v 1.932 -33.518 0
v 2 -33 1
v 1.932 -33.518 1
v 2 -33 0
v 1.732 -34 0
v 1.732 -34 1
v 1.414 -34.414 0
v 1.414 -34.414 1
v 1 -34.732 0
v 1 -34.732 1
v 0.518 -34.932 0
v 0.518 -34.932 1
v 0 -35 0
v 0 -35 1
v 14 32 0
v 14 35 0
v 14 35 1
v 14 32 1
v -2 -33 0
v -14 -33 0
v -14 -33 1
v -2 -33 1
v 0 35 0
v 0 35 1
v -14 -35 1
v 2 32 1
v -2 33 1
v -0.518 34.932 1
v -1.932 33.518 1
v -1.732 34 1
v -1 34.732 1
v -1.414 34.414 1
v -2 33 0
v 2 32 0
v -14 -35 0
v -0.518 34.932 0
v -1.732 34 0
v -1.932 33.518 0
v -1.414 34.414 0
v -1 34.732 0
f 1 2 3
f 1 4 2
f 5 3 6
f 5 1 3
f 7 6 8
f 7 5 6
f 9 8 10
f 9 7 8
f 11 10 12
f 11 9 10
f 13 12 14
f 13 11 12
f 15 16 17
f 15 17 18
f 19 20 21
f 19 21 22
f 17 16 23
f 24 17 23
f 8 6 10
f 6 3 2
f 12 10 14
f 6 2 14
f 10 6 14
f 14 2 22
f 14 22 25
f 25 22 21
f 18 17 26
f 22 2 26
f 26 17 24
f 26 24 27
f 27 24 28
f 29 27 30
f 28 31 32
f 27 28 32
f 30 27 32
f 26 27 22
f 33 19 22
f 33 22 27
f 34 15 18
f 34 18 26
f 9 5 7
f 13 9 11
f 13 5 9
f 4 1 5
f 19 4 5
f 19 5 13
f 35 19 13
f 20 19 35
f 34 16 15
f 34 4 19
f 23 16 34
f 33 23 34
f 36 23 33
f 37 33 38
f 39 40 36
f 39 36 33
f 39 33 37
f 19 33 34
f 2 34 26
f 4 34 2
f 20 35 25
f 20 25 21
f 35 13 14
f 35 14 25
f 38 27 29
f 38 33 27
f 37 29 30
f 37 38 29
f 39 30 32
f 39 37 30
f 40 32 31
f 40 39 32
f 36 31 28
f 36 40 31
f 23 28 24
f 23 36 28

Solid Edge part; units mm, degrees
sketch "Sketch1" plane through (0, 0, 0) normal (0, 0, 1) x (1, 0, 0)
  line L0 (14, 35) -> (14, 32)
  line L1 (14, 32) -> (2, 32)
  line L2 (2, 32) -> (2, -33)
  arc A0 (2, -33) -> (0, -35) centre (0, -33) cw
  line L3 (0, -35) -> (-14, -35)
  line L4 (-14, -35) -> (-14, -33)
  line L5 (-14, -33) -> (-2, -33)
  line L6 (-2, -33) -> (-2, 33)
  arc A1 (-2, 33) -> (0, 35) centre (0, 33) cw
  line L7 (14, 35) -> (0, 35)
  dimension "D1" = 3
  dimension "D2" = 12
  dimension "D3" = 2
  dimension "D4" = 2
  dimension "D5" = 65
  dimension "D6" = 4
  dimension "D7" = 66
  dimension "D8" = 2
extrude "Ajout_matière_1" add sketch "Sketch1" along normal blind 1
properties material "Acier S235"
